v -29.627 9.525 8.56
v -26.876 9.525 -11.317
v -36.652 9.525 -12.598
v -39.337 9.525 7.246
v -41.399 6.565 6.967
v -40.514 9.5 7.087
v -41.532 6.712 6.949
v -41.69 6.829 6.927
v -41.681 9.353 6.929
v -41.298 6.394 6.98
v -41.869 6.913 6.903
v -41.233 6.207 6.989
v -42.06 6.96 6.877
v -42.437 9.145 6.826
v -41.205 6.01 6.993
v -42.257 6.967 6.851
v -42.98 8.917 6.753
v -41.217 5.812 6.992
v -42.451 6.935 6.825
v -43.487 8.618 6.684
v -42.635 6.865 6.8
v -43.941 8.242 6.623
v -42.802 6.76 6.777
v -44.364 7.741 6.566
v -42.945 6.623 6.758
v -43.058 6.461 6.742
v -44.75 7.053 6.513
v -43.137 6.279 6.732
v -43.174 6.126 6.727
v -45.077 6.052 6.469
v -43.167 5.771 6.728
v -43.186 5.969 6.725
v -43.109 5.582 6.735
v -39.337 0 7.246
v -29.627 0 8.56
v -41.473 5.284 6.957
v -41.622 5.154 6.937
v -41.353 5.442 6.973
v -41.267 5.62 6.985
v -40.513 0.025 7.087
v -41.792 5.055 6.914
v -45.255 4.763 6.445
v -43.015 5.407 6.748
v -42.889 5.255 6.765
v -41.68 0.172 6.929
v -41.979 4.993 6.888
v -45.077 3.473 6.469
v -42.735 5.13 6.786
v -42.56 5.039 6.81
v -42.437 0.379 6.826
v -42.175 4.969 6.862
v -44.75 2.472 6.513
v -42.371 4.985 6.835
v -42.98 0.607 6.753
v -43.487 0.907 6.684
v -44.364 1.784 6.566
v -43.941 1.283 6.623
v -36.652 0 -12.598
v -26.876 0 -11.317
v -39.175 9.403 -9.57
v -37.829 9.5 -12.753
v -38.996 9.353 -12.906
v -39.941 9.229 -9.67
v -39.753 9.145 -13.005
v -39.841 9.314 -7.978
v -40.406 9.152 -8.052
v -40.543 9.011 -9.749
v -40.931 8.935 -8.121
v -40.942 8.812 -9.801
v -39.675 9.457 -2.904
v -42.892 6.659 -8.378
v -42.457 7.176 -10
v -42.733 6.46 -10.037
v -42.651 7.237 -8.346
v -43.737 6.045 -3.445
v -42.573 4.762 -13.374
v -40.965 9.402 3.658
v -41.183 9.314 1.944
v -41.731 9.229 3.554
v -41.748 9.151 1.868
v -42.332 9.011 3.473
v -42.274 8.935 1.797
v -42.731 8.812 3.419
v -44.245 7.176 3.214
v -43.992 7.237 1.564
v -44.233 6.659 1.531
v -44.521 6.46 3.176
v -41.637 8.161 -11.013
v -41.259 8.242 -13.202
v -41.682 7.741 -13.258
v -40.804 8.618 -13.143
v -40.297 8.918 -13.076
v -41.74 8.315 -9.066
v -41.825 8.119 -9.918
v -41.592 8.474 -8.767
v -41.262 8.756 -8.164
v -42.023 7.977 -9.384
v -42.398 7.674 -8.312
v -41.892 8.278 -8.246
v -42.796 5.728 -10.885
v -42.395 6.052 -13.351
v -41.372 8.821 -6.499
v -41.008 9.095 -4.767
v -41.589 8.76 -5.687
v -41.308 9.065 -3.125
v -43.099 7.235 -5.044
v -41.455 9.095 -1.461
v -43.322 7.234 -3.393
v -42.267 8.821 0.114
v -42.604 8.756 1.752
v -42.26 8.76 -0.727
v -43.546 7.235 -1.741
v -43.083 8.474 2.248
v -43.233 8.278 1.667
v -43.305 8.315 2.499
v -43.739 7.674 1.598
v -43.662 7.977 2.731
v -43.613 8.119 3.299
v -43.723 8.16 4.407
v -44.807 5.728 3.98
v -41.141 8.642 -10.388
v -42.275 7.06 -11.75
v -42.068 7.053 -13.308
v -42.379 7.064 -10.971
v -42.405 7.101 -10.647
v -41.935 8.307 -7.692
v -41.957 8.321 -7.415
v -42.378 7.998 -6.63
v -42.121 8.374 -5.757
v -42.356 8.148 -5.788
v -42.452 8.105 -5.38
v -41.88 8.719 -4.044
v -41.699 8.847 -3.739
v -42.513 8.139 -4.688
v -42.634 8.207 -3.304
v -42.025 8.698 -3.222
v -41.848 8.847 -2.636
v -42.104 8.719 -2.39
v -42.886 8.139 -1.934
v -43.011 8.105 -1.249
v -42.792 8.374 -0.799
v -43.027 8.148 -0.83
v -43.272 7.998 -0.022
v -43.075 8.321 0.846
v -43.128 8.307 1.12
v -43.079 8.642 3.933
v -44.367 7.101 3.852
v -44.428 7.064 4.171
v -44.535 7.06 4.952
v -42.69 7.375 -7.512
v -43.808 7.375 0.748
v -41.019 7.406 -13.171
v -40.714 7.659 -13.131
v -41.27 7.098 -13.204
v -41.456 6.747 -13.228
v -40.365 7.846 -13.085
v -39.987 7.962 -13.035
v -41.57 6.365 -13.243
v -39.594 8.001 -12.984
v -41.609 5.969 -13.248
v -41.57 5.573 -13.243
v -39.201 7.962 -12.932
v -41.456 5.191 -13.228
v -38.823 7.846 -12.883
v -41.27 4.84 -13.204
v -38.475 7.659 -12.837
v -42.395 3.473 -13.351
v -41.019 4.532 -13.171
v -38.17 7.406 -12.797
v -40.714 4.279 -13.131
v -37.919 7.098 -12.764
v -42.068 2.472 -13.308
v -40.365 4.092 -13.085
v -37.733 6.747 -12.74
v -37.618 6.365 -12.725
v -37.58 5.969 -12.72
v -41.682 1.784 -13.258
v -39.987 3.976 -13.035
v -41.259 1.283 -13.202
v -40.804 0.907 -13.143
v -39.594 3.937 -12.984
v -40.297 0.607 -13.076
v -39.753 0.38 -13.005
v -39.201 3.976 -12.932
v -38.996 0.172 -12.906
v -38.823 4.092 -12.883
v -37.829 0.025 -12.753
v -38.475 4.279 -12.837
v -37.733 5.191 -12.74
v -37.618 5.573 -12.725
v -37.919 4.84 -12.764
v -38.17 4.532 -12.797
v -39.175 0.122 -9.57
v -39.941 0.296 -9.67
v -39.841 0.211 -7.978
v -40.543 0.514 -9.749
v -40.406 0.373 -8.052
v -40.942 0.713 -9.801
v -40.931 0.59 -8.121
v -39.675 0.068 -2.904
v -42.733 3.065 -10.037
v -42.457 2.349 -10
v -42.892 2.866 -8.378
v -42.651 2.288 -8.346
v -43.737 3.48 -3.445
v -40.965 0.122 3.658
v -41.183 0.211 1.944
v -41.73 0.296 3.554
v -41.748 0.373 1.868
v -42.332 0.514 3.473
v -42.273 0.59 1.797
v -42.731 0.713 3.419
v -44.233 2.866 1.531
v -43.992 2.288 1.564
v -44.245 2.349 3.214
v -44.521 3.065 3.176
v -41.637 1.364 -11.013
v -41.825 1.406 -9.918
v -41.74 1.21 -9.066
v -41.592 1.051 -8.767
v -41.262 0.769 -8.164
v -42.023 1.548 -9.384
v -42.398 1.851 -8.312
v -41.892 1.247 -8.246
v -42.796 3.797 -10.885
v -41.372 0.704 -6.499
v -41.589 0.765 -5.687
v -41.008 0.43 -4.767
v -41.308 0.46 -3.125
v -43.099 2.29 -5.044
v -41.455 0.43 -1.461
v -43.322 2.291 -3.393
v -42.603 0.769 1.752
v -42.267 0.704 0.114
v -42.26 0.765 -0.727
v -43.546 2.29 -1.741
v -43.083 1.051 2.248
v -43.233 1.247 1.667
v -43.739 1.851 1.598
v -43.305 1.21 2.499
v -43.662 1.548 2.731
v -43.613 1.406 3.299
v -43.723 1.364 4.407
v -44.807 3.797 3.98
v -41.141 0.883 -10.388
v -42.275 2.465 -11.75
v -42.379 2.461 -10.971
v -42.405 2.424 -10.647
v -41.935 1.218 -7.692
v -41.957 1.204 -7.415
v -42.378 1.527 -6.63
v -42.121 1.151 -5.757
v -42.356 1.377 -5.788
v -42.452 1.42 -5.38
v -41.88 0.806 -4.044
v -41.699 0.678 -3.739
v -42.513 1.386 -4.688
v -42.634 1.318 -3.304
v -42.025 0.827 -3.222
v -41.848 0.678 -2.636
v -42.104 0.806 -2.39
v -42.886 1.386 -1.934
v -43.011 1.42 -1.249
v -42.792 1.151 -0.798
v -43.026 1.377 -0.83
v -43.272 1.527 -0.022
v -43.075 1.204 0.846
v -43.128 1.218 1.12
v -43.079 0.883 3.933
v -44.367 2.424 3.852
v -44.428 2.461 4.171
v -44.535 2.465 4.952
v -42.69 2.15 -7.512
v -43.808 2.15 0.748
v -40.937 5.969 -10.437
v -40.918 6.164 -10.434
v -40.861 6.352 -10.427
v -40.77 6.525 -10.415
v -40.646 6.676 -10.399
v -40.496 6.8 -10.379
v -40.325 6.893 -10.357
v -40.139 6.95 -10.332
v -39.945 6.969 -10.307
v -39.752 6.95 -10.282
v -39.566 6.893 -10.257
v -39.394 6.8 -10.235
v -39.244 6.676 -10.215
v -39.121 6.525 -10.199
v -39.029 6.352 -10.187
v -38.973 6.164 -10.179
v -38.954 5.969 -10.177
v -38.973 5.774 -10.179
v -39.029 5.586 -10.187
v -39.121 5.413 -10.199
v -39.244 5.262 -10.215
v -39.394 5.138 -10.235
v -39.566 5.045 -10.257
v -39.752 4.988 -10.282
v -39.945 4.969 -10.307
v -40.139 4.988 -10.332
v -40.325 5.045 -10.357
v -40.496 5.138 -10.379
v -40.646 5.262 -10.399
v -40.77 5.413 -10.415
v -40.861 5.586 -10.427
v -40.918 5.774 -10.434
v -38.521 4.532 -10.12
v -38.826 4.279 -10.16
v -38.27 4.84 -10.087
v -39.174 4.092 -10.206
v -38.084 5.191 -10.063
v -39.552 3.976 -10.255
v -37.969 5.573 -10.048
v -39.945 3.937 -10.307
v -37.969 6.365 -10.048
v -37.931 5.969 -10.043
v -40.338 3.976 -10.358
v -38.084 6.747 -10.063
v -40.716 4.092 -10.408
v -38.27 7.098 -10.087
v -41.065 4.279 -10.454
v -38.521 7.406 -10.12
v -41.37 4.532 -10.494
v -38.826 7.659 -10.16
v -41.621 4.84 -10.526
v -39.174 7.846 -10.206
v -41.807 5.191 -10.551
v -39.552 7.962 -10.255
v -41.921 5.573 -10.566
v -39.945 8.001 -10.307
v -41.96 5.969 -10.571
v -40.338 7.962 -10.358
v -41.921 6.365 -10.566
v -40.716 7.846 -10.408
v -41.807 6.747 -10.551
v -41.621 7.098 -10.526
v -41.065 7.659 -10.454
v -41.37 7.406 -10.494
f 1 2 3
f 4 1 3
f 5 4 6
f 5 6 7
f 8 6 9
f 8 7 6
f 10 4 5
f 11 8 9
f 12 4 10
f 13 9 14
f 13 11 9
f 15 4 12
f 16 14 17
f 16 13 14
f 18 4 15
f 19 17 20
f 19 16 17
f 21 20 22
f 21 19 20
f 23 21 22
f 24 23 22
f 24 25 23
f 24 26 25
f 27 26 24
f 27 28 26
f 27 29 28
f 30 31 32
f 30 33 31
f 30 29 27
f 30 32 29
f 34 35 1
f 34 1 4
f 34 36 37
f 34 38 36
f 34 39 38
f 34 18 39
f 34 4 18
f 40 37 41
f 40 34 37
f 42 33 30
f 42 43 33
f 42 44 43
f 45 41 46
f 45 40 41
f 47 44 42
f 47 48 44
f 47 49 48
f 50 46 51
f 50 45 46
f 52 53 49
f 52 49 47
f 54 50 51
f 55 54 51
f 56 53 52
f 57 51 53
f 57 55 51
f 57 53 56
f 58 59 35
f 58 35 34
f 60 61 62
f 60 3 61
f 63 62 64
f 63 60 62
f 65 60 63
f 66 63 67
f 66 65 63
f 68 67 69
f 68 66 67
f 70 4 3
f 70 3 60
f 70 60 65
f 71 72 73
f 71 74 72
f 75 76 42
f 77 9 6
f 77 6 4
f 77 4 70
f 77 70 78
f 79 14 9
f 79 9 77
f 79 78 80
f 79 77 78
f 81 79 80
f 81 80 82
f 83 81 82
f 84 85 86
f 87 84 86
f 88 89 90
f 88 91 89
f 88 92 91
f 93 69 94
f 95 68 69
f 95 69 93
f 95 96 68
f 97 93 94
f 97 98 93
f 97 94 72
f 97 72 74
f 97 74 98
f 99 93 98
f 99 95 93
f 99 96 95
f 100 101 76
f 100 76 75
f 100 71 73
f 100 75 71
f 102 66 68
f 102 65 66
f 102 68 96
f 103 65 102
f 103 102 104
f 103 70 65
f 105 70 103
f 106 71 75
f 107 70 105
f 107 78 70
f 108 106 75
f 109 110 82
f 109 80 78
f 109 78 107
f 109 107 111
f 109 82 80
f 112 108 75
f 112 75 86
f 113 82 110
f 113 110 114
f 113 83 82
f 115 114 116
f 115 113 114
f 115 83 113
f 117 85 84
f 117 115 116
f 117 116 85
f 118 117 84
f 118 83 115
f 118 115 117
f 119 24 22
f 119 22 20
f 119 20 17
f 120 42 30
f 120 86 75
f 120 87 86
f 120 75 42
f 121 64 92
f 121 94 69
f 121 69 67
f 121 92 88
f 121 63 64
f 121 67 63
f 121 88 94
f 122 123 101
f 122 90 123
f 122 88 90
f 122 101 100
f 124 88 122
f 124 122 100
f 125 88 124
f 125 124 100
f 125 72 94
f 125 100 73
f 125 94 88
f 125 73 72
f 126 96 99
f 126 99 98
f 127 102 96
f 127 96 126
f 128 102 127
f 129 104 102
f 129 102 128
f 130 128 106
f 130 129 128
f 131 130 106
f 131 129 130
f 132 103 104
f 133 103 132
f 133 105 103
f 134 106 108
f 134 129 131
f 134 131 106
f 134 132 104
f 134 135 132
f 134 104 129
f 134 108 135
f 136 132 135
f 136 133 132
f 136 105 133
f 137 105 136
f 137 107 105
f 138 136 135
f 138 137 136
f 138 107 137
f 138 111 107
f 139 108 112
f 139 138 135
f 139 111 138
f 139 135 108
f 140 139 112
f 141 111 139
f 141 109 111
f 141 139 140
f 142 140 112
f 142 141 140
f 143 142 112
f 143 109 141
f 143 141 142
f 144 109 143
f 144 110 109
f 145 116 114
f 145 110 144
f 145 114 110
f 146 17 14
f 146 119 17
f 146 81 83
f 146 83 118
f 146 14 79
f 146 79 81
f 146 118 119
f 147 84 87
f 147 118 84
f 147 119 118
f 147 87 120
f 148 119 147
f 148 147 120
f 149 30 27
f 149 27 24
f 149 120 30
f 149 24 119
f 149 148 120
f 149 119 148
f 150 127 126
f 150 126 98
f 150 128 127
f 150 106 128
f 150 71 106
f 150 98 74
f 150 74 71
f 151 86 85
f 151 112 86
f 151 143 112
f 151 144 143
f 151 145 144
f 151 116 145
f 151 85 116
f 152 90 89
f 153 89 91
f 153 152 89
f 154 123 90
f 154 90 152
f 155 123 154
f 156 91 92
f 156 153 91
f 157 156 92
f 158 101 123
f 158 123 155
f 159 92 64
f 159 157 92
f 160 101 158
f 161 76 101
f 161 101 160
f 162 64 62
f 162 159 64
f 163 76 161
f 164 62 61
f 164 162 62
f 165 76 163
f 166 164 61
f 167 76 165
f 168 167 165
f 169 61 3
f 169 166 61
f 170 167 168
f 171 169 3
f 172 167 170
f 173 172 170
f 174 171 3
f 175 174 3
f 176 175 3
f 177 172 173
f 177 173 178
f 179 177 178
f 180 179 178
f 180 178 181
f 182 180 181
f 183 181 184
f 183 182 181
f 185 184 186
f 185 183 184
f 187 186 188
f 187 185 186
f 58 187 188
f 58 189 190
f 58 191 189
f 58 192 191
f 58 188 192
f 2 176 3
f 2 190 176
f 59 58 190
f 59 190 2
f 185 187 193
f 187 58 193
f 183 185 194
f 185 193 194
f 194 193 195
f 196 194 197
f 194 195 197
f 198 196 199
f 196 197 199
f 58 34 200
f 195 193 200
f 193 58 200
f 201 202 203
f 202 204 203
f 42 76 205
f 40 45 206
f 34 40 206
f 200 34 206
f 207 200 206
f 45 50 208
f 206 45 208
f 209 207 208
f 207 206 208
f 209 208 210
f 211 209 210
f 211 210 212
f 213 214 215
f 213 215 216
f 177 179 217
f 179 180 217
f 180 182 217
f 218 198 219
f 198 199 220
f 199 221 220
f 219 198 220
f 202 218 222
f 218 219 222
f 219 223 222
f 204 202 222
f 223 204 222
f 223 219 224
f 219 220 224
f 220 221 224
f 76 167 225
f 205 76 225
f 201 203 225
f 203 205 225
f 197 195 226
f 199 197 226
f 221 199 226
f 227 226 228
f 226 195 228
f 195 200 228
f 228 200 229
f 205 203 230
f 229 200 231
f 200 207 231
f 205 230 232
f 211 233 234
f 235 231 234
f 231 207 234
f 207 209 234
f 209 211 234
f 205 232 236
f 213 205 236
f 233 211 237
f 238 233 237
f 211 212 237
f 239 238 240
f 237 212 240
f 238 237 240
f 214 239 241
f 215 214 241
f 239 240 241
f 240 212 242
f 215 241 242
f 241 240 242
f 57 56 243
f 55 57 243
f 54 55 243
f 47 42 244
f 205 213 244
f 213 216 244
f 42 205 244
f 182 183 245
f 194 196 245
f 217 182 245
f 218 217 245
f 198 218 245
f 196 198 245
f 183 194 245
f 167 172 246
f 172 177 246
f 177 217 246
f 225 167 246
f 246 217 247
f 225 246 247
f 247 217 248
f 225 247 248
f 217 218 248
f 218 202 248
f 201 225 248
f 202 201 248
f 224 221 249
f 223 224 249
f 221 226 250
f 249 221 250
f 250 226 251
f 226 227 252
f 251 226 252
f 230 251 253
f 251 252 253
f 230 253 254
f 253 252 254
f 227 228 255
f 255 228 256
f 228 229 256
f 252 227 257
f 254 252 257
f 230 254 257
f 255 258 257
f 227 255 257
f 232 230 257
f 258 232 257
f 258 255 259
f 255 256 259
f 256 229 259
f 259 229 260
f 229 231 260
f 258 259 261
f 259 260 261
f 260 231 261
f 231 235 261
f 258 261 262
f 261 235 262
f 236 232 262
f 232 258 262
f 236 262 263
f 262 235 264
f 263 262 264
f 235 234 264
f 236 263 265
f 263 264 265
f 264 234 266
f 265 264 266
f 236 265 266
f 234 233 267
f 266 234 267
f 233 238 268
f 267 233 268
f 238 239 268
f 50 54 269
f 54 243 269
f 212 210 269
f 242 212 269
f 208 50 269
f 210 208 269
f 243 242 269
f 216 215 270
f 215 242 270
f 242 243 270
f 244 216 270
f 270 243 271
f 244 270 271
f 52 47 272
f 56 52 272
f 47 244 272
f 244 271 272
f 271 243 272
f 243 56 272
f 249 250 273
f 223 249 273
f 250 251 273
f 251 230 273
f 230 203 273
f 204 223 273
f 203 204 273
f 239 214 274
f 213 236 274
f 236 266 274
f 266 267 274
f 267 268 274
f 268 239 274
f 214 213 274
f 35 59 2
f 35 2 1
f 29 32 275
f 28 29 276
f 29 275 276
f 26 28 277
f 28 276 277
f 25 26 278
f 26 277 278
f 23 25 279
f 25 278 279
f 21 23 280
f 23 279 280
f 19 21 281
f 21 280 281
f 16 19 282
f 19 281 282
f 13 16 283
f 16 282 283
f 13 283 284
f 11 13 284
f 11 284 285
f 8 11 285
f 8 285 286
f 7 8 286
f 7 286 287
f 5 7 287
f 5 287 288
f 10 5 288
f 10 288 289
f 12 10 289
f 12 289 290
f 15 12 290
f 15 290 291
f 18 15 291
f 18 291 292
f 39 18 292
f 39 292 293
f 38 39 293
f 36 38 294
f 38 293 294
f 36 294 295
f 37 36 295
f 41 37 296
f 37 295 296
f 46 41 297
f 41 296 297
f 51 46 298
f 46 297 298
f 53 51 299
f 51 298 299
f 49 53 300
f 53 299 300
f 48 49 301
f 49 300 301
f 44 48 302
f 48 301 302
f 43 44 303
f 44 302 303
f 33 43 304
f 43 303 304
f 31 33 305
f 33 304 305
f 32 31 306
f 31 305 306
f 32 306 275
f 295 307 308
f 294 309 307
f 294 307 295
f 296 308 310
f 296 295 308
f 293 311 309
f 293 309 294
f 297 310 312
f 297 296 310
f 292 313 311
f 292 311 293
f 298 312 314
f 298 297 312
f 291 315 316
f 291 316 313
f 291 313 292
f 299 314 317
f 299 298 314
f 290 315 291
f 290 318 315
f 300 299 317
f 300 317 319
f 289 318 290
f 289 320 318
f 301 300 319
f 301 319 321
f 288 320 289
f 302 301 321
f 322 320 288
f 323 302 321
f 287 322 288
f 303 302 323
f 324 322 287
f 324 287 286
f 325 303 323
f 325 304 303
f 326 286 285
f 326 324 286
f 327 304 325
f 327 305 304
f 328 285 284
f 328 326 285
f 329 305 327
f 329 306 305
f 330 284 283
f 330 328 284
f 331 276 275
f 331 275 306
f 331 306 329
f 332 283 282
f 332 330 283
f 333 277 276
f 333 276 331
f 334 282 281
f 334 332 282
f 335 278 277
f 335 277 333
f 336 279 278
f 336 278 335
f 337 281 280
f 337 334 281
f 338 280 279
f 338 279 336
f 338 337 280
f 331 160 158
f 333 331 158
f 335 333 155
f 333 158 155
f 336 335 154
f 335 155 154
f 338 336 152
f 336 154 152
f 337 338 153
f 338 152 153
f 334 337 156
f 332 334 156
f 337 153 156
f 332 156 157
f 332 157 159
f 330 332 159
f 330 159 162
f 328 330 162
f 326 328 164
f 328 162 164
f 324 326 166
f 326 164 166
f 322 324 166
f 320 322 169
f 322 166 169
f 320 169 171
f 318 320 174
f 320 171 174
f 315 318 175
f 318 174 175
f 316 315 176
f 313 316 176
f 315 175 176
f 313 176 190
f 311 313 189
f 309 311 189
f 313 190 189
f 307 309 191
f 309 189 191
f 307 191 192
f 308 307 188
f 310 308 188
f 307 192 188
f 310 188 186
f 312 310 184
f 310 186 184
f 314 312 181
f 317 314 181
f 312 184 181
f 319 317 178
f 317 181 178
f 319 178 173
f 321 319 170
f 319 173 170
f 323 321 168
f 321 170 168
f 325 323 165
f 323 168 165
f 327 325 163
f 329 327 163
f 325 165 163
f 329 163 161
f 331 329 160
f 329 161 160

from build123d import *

# Parameters (mm, degrees)
BOSS_EXTRUDE1_DEPTH = 9.525
SKETCH3_R           = 2.032
CUT_EXTRUDE1_DEPTH  = 2.7
SKETCH4_R           = 1.000000032
CUT_EXTRUDE2_DEPTH  = 49.829451626
FILLET2_SIZE        = 6


with BuildPart() as part:
    # Sketch1 → Boss-Extrude1 (new body)
    with BuildSketch(Plane(origin=(0, 0, 0), x_dir=(1, 0, 0), z_dir=(0, 1, 0))):
        Polygon((-29.626544256, -8.559809399), (-45.282501527, -6.441378612), (-42.600711235, 13.378005859), (-26.876432388, 11.317015404), align=None)
    extrude(amount=BOSS_EXTRUDE1_DEPTH)

    # Sketch3 → Cut-Extrude1 (cut)
    with BuildSketch(Plane(origin=(1.004349985, 0, -7.662664899), x_dir=(-0.9915193653276276, 0, -0.12995902500518686), z_dir=(0.12995902500518686, 0, -0.9915193653276276))):
        with Locations((40.946022732, 5.969)):
            Circle(SKETCH3_R)
    extrude(amount=-CUT_EXTRUDE1_DEPTH, mode=Mode.SUBTRACT)

    # Sketch4 → Cut-Extrude2 (cut, through all)
    with BuildSketch(Plane(origin=(0.653460617, 0, -4.985562613), x_dir=(-0.9915193653276276, 0, -0.12995902500518688), z_dir=(0.12995902500518688, 0, -0.9915193653276276))):
        with Locations((40.946022732, 5.969)):
            Circle(SKETCH4_R)
    extrude(amount=-CUT_EXTRUDE2_DEPTH, mode=Mode.SUBTRACT)

    # Fillet2
    # a fillet whose section is not a circle: 6 mm, written as the material it takes off along each edge
    with BuildSketch(Plane(origin=(-47.293844247, 9.525, 21.305916966), x_dir=(0.9909692235697757, 0, 0.13408951464419594), z_dir=(0.13408951464419594, 0, -0.9909692235697757))) as fillet2_piece_1:
        with BuildLine():
            add(Edge.make_bspline([(FILLET2_SIZE, 0), (FILLET2_SIZE * 0.831801948466, 0), (FILLET2_SIZE * 0.663603896932, 0), (FILLET2_SIZE * 0.292893218813, FILLET2_SIZE * 0.0716919198361), (FILLET2_SIZE * 0.0716919198361, FILLET2_SIZE * 0.292893218813), (0, FILLET2_SIZE * 0.663603896932), (0, FILLET2_SIZE * 0.831801948466), (0, FILLET2_SIZE)], knots=[0, 0, 0, 0, 0, 0, 0.5, 0.5, 1, 1, 1, 1, 1, 1], degree=5))
            Line((0, FILLET2_SIZE), (0, 0))
            Line((0, 0), (FILLET2_SIZE, 0))
        make_face()
    extrude(amount=50, mode=Mode.SUBTRACT)
    with BuildSketch(Plane(origin=(-47.293844247, 0, 21.305916966), x_dir=(0.9909692235697757, 0, 0.13408951464419594), z_dir=(0.13408951464419594, 0, -0.9909692235697757))) as fillet2_piece_2:
        with BuildLine():
            add(Edge.make_bspline([(FILLET2_SIZE, 0), (FILLET2_SIZE * 0.831801948466, 0), (FILLET2_SIZE * 0.663603896932, 0), (FILLET2_SIZE * 0.292893218813, -FILLET2_SIZE * 0.0716919198361), (FILLET2_SIZE * 0.0716919198361, -FILLET2_SIZE * 0.292893218813), (0, -FILLET2_SIZE * 0.663603896932), (0, -FILLET2_SIZE * 0.831801948466), (0, -FILLET2_SIZE)], knots=[0, 0, 0, 0, 0, 0, 0.5, 0.5, 1, 1, 1, 1, 1, 1], degree=5))
            Line((0, -FILLET2_SIZE), (0, 0))
            Line((0, 0), (FILLET2_SIZE, 0))
        make_face()
    extrude(amount=50, mode=Mode.SUBTRACT)


solid = part.part
